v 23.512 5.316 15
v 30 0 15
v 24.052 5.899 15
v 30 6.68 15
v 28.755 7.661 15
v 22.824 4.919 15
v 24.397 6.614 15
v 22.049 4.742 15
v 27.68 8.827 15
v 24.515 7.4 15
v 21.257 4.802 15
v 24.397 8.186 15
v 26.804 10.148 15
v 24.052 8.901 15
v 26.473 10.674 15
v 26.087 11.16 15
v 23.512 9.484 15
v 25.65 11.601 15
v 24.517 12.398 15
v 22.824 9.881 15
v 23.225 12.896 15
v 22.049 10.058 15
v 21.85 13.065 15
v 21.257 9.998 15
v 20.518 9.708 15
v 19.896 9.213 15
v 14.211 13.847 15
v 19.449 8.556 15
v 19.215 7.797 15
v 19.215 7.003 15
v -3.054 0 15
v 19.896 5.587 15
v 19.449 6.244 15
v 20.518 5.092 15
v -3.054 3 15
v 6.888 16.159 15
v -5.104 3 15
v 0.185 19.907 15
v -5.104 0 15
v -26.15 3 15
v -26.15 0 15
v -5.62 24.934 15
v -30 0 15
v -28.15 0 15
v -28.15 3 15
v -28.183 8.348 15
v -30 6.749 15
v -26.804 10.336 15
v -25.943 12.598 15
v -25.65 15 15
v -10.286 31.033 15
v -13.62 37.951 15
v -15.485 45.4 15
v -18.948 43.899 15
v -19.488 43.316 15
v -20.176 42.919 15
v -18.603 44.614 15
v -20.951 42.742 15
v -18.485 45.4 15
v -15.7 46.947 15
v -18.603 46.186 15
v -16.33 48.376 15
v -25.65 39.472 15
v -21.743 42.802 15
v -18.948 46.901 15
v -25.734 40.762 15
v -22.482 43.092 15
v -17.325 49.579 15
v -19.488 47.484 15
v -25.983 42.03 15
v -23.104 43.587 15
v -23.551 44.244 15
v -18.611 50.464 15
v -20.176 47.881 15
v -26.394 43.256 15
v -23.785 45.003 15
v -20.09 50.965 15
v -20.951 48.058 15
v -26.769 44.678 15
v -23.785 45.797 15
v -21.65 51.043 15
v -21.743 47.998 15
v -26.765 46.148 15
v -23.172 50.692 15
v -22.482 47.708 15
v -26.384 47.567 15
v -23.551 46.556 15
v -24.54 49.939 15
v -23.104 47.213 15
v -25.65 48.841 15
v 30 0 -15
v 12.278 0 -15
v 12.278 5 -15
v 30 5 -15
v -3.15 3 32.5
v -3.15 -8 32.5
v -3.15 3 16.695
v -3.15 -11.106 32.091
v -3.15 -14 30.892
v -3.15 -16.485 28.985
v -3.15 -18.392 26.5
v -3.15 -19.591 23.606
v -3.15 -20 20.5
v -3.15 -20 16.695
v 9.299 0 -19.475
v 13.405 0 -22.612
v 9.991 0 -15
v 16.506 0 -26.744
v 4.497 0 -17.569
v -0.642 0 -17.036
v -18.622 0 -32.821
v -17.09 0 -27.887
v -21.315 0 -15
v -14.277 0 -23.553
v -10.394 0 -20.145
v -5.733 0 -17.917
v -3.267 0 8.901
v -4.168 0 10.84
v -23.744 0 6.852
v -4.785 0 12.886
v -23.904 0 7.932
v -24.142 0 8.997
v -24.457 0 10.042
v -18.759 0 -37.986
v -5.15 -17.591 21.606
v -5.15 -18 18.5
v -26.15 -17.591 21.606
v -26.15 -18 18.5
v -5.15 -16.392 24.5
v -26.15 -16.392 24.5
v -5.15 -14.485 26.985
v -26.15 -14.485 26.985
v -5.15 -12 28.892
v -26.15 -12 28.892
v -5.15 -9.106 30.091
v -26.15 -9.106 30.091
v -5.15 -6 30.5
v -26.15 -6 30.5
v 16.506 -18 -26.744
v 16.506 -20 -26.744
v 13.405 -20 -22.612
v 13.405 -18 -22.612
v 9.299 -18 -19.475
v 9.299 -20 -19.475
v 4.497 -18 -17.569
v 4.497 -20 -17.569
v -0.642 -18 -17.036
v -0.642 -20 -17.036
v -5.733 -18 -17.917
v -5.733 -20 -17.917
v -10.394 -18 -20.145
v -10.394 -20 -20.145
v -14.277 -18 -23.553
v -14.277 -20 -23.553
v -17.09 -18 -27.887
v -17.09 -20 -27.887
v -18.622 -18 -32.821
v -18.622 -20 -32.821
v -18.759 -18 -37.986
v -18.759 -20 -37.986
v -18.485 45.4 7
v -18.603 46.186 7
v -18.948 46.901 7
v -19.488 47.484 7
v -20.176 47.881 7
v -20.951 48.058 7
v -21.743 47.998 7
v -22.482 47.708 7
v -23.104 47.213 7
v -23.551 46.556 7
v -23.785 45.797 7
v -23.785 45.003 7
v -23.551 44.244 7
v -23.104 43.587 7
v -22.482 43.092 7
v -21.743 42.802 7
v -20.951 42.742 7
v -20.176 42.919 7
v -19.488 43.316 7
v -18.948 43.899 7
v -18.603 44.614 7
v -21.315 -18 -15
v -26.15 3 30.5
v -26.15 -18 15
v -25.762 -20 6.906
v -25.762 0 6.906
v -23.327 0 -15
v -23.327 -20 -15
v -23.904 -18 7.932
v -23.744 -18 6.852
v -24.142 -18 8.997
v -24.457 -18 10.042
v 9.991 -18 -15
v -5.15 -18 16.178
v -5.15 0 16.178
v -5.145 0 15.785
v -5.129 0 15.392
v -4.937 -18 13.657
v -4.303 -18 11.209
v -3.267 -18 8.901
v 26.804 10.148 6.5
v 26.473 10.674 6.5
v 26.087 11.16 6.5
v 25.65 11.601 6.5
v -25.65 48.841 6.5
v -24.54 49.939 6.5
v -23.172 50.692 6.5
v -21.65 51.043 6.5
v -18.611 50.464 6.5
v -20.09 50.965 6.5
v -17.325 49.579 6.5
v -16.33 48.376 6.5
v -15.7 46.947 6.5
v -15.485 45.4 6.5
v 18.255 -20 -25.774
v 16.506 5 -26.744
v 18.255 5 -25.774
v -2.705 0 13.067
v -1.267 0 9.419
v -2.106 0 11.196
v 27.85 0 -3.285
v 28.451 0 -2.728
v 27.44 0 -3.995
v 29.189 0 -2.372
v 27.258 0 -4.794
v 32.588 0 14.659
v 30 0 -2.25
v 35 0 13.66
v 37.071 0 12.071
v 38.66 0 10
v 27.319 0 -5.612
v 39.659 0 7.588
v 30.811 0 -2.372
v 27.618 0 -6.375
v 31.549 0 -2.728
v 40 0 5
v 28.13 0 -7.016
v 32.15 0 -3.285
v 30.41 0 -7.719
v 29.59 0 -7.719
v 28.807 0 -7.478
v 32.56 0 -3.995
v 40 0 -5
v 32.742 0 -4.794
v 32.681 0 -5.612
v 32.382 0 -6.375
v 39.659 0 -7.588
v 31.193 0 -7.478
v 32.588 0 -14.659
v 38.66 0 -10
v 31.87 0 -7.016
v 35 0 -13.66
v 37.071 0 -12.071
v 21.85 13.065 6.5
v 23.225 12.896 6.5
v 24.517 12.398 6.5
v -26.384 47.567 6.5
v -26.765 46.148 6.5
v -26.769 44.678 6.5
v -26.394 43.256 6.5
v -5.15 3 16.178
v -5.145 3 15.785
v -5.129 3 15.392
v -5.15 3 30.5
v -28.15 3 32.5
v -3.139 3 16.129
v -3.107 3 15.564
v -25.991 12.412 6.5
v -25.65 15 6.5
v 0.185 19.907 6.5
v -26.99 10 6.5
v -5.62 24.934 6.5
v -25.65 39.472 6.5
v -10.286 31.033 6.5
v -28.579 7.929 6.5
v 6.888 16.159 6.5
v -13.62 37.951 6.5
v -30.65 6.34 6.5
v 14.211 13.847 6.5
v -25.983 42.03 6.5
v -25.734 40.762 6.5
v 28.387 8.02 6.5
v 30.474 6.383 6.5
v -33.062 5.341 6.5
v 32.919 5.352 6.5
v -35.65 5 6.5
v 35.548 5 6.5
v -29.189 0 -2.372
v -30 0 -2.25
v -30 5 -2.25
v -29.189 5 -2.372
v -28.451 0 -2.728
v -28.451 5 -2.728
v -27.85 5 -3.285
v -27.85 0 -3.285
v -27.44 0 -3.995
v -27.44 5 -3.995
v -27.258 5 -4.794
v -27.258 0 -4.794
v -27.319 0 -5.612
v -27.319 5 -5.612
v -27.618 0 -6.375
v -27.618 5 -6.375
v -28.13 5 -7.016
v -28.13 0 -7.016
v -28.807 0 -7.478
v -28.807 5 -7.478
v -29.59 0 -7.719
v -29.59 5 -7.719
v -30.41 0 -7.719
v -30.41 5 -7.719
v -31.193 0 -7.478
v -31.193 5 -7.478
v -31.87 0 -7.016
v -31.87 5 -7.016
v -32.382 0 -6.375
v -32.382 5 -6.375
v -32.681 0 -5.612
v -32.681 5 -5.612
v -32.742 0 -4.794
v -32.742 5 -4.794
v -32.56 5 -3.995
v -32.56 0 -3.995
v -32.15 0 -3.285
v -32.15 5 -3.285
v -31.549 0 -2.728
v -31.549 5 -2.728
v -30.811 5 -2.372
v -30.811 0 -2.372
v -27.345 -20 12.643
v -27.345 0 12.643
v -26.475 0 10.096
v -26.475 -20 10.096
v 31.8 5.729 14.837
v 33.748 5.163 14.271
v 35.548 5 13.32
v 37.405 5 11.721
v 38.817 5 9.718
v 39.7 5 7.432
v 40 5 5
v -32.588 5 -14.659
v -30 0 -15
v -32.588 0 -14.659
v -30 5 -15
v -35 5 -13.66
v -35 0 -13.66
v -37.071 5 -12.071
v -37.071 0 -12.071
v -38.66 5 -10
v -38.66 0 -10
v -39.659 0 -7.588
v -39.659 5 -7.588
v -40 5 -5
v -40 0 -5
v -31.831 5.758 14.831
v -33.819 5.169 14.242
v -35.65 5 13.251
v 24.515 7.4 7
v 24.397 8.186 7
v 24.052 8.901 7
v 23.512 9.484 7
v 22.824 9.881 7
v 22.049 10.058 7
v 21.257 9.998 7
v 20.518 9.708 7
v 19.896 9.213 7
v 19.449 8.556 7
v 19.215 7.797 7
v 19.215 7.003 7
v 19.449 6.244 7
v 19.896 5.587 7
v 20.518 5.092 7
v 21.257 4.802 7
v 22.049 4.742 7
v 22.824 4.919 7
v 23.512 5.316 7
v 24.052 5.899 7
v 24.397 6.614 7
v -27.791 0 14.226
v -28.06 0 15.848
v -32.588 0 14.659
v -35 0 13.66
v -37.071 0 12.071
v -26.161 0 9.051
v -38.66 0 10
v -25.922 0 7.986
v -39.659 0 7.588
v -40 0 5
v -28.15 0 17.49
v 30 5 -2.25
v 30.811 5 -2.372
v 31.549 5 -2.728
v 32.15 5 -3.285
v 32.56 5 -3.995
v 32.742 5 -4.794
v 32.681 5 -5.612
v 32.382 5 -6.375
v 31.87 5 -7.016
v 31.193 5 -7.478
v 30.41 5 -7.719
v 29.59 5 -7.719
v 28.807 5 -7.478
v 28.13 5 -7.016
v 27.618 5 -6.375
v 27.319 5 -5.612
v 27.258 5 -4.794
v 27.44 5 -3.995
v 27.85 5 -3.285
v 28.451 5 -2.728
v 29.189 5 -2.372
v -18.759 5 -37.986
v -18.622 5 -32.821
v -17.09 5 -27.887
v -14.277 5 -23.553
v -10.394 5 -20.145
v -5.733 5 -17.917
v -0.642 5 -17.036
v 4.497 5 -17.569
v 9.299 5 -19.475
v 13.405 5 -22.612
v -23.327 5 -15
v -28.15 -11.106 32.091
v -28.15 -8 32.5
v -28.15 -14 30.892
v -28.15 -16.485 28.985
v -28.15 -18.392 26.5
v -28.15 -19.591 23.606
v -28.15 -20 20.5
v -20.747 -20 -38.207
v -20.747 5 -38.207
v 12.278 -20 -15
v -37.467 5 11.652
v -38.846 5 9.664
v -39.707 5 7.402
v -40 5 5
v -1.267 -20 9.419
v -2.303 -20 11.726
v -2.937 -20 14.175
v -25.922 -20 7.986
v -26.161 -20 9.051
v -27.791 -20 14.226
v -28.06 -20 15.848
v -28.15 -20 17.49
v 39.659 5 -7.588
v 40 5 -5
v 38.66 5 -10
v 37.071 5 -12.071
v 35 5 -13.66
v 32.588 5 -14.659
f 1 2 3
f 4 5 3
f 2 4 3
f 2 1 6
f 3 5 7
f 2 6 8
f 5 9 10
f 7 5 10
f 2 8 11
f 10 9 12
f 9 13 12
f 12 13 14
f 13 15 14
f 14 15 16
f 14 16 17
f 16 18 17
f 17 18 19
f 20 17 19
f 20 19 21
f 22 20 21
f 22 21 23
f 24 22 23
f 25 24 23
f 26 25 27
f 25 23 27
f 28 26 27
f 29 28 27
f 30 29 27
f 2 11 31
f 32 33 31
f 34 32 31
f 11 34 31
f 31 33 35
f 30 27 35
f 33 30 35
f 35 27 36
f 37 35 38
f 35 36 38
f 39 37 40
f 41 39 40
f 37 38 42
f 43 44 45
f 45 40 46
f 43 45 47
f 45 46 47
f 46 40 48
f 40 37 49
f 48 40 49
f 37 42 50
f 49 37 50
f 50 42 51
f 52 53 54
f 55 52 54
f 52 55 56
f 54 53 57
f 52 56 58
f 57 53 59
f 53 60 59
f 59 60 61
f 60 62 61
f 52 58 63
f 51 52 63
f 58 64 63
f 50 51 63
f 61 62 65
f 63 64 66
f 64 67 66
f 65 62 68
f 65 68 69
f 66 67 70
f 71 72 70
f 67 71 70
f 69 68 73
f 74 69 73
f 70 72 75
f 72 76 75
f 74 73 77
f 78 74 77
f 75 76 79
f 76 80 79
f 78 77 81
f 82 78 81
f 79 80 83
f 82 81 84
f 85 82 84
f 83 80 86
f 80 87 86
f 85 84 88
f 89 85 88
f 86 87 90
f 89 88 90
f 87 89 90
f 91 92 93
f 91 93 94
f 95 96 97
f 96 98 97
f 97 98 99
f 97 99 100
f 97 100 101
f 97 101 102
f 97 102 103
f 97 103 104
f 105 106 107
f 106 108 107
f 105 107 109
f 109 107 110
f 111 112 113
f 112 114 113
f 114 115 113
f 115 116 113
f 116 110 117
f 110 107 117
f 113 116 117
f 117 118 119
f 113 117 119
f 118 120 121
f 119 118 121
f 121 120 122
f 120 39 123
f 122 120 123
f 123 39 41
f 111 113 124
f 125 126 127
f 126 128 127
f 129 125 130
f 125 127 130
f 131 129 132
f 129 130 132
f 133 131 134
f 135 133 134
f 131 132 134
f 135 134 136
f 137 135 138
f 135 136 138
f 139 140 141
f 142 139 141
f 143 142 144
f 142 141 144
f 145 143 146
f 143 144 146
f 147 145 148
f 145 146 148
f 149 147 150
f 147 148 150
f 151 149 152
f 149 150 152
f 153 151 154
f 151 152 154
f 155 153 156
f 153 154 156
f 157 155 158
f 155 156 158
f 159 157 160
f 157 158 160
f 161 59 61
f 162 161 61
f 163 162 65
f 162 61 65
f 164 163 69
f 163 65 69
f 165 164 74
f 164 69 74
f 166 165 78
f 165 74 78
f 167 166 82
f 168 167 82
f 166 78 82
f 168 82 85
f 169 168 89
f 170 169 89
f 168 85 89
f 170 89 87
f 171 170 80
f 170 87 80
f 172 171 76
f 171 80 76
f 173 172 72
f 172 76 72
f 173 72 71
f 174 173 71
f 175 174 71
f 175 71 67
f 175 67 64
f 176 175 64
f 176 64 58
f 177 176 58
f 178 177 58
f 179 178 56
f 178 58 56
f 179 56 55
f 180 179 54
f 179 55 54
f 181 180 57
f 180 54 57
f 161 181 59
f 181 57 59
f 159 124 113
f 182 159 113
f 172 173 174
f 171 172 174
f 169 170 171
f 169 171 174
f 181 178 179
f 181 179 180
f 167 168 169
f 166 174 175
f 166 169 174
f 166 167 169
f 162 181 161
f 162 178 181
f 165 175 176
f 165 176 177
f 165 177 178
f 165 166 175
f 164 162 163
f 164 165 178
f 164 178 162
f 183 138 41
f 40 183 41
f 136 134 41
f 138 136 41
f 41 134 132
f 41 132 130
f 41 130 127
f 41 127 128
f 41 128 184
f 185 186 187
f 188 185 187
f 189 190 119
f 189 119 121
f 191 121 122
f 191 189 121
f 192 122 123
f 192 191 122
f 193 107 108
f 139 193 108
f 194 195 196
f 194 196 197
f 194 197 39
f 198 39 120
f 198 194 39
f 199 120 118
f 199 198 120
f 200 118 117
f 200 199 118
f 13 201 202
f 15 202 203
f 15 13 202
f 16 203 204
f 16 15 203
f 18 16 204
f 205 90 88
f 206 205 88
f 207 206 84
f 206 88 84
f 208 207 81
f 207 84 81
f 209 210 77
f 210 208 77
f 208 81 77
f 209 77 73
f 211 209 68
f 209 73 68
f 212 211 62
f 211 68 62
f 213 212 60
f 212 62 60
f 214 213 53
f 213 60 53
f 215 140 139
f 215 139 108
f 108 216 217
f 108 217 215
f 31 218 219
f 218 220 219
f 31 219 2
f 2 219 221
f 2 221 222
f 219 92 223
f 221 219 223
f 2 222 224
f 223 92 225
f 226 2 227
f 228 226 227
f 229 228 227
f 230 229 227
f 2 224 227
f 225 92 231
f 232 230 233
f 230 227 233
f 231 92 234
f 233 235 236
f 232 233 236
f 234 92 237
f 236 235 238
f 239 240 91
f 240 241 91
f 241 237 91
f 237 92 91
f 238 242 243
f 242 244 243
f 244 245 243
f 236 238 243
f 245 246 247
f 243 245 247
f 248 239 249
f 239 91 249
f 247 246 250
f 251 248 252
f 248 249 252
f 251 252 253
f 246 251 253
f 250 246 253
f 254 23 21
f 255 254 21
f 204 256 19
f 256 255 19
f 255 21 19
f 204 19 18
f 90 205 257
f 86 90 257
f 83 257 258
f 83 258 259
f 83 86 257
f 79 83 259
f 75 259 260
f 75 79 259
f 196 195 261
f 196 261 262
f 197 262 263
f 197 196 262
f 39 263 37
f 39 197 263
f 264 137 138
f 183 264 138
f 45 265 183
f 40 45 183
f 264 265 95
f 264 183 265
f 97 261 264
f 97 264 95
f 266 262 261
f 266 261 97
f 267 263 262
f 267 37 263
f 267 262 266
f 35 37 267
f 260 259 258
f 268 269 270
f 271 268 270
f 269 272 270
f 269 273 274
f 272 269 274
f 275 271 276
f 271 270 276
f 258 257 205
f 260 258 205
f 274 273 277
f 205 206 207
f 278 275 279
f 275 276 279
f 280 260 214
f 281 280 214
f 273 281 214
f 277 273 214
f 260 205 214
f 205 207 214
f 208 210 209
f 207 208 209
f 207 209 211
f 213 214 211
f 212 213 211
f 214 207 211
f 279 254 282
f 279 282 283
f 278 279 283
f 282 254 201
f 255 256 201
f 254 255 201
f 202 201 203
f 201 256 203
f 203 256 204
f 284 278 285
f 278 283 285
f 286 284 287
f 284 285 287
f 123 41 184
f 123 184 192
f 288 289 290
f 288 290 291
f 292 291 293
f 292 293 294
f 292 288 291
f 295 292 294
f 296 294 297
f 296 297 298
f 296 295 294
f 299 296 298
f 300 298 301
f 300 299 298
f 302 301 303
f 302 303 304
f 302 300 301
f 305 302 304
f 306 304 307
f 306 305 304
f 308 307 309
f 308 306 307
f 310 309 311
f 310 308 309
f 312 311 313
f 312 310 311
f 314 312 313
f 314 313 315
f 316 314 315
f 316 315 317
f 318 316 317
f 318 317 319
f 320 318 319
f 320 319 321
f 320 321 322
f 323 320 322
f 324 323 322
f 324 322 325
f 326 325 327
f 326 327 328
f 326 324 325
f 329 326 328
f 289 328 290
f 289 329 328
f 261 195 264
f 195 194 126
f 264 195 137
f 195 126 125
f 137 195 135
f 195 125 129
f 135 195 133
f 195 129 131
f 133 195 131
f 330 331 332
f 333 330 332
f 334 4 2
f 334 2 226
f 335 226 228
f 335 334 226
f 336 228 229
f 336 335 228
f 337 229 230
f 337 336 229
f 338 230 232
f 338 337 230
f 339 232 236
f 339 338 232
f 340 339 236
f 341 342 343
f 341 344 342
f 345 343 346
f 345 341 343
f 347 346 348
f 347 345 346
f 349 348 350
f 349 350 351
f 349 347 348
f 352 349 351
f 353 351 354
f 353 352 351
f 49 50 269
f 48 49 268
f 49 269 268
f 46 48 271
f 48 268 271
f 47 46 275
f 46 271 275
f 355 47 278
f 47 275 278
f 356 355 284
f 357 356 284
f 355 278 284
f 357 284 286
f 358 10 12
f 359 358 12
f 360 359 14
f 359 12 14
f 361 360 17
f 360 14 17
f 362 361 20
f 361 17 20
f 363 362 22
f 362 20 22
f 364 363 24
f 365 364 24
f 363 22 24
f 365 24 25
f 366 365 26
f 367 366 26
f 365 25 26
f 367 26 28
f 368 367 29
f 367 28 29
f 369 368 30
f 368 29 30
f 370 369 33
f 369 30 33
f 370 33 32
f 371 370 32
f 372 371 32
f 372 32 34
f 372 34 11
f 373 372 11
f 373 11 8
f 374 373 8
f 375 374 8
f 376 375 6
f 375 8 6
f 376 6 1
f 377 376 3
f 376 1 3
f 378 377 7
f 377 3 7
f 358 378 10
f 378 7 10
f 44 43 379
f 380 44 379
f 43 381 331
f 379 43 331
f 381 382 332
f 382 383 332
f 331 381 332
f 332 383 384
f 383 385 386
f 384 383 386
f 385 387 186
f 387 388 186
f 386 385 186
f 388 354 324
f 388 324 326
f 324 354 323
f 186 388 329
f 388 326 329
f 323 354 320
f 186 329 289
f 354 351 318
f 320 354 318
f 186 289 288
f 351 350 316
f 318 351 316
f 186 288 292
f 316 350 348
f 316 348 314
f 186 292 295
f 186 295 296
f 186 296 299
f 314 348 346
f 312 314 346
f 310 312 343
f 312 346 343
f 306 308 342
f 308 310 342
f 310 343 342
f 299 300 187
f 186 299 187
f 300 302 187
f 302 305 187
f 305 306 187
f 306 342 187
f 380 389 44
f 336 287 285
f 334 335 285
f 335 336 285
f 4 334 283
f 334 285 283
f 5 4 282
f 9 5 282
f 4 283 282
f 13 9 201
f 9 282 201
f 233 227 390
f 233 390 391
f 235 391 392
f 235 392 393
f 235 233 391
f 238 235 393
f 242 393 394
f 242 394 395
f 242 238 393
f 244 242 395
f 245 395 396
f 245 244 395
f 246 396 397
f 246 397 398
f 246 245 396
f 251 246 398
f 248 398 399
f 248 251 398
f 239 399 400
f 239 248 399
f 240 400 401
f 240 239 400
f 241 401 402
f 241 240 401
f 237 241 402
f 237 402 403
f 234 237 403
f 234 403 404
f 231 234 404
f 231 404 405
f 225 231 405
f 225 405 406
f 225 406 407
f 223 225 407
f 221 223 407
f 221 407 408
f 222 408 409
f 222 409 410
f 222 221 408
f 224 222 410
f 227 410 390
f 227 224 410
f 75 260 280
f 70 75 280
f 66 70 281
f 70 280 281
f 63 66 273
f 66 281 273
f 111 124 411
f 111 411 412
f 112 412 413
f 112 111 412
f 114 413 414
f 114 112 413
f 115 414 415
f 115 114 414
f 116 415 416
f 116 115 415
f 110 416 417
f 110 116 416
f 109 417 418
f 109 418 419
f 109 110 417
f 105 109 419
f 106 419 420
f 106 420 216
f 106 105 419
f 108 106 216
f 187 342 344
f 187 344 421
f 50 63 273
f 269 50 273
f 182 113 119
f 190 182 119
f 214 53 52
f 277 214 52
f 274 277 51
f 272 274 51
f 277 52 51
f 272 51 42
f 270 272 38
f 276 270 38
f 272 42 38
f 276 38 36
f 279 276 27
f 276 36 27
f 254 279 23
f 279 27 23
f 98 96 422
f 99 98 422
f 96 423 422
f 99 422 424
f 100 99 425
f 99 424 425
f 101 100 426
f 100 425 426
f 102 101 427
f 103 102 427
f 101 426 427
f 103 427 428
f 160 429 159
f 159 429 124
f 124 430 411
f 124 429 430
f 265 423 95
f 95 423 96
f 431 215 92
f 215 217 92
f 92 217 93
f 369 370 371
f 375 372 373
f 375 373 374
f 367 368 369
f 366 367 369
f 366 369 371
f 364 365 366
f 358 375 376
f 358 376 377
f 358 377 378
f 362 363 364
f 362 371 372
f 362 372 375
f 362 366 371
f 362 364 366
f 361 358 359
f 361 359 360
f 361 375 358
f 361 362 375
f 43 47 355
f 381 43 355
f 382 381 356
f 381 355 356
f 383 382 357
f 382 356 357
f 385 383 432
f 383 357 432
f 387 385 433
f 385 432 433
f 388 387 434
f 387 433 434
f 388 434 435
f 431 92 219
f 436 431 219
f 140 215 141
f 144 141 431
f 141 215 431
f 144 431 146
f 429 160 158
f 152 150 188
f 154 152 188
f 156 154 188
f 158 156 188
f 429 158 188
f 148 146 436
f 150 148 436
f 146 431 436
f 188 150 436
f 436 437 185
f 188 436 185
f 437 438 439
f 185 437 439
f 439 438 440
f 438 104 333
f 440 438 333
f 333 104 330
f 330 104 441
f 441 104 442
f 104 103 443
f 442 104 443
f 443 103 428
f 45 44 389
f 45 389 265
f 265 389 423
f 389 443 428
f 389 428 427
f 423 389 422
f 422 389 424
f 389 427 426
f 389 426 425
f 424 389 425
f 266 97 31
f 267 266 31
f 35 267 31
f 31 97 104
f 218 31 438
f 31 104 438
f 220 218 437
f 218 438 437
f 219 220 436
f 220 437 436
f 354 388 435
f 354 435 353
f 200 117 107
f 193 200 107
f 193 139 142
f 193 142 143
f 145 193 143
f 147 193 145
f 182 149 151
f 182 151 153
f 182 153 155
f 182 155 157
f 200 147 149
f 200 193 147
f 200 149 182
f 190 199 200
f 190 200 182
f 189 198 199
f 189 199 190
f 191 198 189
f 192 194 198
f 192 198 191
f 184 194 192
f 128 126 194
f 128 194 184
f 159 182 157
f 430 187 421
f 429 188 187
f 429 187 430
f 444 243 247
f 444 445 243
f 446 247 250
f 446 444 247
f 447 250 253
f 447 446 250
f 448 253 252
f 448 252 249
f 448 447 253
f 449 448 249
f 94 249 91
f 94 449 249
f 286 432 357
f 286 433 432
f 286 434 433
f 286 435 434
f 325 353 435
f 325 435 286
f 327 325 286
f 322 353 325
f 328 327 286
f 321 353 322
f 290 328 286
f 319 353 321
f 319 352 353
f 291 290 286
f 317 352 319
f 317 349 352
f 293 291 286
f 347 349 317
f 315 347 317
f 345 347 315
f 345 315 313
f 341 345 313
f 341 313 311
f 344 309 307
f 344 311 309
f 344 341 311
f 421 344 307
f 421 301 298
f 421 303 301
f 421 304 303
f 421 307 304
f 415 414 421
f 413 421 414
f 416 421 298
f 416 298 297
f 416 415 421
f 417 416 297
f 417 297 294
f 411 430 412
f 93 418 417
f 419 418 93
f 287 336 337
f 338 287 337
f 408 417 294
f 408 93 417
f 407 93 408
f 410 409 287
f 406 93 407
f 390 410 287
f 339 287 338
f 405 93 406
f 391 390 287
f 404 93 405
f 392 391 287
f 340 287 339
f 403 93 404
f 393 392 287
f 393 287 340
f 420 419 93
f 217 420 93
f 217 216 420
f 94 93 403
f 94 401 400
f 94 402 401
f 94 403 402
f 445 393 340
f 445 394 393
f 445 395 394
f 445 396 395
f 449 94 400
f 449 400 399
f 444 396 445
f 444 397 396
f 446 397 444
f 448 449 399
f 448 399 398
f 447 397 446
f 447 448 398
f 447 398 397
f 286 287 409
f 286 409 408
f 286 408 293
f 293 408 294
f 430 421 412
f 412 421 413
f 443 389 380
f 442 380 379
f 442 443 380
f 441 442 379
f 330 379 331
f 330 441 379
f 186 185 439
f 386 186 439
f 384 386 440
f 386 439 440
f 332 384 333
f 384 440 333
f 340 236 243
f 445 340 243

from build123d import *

# Parameters (mm, degrees)
SKETCH1_W           = 80
SKETCH1_H           = 30
SKETCH1_R           = 2.75
BOSS_EXTRUDE1_DEPTH = 5
SKETCH2_W           = 51.3
SKETCH2_H           = 8.5
BOSS_EXTRUDE2_DEPTH = 50
SKETCH3_R           = 2.665
CUT_EXTRUDE1_DEPTH  = 8
CUT_EXTRUDE2_REACH  = 76.33
BOSS_EXTRUDE3_DEPTH = 8.5
FILLET1_START       = 6.5
FILLET1_DEPTH       = 8.5
FILLET2_R           = 10
BOSS_EXTRUDE5_DEPTH = 5
BOSS_EXTRUDE6_DEPTH = 20
BOSS_EXTRUDE7_DEPTH = 20
CUT_EXTRUDE3_DEPTH  = 20
BOSS_EXTRUDE8_DEPTH = 3
FILLET4_START       = -20
FILLET4_DEPTH       = 20
FILLET4_2_DEPTH     = 4
FILLET4_3_DEPTH     = 23
BOSS_EXTRUDE9_DEPTH = 2
FILLET5_R           = 12


with BuildPart() as part:
    # Sketch1 → Boss-Extrude1 (new body)
    with BuildSketch(Plane(origin=(0, 0, 0), x_dir=(1, 0, 0), z_dir=(0, 1, 0))):
        Rectangle(SKETCH1_W, SKETCH1_H)
        with Locations(Location((30, 5, 0), (0, 0, 270))):
            Circle(SKETCH1_R, mode=Mode.SUBTRACT)
        with Locations(Location((-30, 5, 0), (0, 0, 270))):
            Circle(SKETCH1_R, mode=Mode.SUBTRACT)
    extrude(amount=BOSS_EXTRUDE1_DEPTH)

    # Sketch2 → Boss-Extrude2 (add)
    with BuildSketch(Plane(origin=(0, 5, 0), x_dir=(1, 0, 0), z_dir=(0, 1, 0))):
        with Locations((0, -10.75)):
            Rectangle(SKETCH2_W, SKETCH2_H)
    extrude(amount=BOSS_EXTRUDE2_DEPTH)

    # Sketch3 → Cut-Extrude1 (cut)
    with BuildSketch(Plane.XY.offset(15)):
        with Locations((21.85, 7.4)):
            Circle(SKETCH3_R)
        with Locations((-21.15, 45.4)):
            Circle(SKETCH3_R)
    extrude(amount=-CUT_EXTRUDE1_DEPTH, mode=Mode.SUBTRACT)

    # Sketch5 → Cut-Extrude2 (cut, up to next)
    with BuildSketch(Plane.XY.offset(15), mode=Mode.PRIVATE) as cut_extrude2_sk1:
        with BuildLine():
            ThreePointArc((-15.485, 45.4), (-2.845416832, 22.272479127), (21.85, 13.065))
            ThreePointArc((21.85, 13.065), (23.886047867, 12.68646707), (25.65, 11.601455105))
            Line((25.65, 11.601455105), (25.65, 55))
            Line((25.65, 55), (-25.65, 55))
            Line((-25.65, 55), (-25.65, 48.841253405))
            ThreePointArc((-25.65, 48.841253405), (-19.333447634, 50.765851517), (-15.485, 45.4))
        make_face()
    cut_extrude2_tool1 = extrude(cut_extrude2_sk1.sketch, amount=-CUT_EXTRUDE2_REACH, mode=Mode.PRIVATE) & part.part
    add(cut_extrude2_tool1.solids().sort_by_distance((6.645392, 37.171167, 15))[0], mode=Mode.SUBTRACT)

    # Sketch5<3> → Boss-Extrude3 (add)
    with BuildSketch(Plane.XY.offset(15)):
        with BuildLine():
            Line((25.65, 5), (26.981493447, 5))
            ThreePointArc((26.981493447, 5), (27.380015162, 6.170708615), (27.515, 7.4))
            ThreePointArc((27.515, 7.4), (27.027799967, 9.698393461), (25.65, 11.601455105))
            Line((25.65, 11.601455105), (25.65, 5))
        make_face()
        with BuildLine():
            ThreePointArc((-25.65, 48.841253405), (-26.815, 45.4), (-25.65, 41.958746595))
            Line((-25.65, 41.958746595), (-25.65, 48.841253405))
        make_face()
    extrude(amount=-BOSS_EXTRUDE3_DEPTH)

    # Fillet1: read off the stored shape, not the designer's step
    # Fillet1 outline → Fillet1 (add)
    with BuildSketch(Plane.XY.offset(FILLET1_START)):
        with BuildLine():
            ThreePointArc((-26.393696138, 43.256200613), (-25.837685324, 41.400248446), (-25.65, 39.471912197))
            Line((-25.65, 39.471912197), (-25.65, 41.958746595))
            ThreePointArc((-25.65, 41.958746595), (-26.064849981, 42.582825057), (-26.393696138, 43.256200613))
        make_face()
        with BuildLine():
            Line((-35.65, 5), (-25.65, 5))
            Line((-25.65, 5), (-25.65, 15))
            ThreePointArc((-25.65, 15), (-28.578932188, 7.928932188), (-35.65, 5))
        make_face()
        with BuildLine():
            ThreePointArc((35.547891261, 5), (30.474223926, 6.382697651), (26.803626173, 10.148420045))
            ThreePointArc((26.803626173, 10.148420045), (27.511622265, 7.595597351), (26.981493447, 5))
            Line((26.981493447, 5), (35.547891261, 5))
        make_face()
    extrude(amount=FILLET1_DEPTH)

    # Fillet2
    fillet2_edges = [part.edges().sort_by_distance(p)[0] for p in [
        (40, 2.5, 15),
        (40, 2.5, -15),
        (-40, 2.5, -15),
        (-40, 2.5, 15),
    ]]
    fillet(fillet2_edges, radius=FILLET2_R)

    # Sketch7 → Boss-Extrude5 (add)
    with BuildSketch(Plane.XZ):
        with BuildLine():
            Line((16.505683811, -26.744235317), (9.991112457, -15))
            Line((9.991112457, -15), (-21.314804171, -15))
            Line((-21.314804171, -15), (-18.759427627, -37.985545514))
            ThreePointArc((-18.759427627, -37.985545514), (-5.732504168, -17.916562593), (16.505683811, -26.744235317))
        make_face()
        Polygon((-18.759427627, -37.985545514), (-21.314804171, -15), (-23.327125696, -15), (-20.747181548, -38.206530469), align=None)
        Polygon((12.278203403, -15), (9.991112457, -15), (16.505683811, -26.744235317), (18.25463044, -25.774088066), align=None)
    extrude(amount=-BOSS_EXTRUDE5_DEPTH)

    # Sketch7<6> → Boss-Extrude6 (add)
    with BuildSketch(Plane.XZ):
        Polygon((-4.362909054, 15), (-6.65, 15), (9.991112457, -15), (12.278203403, -15), align=None)
        Polygon((12.278203403, -15), (9.991112457, -15), (16.505683811, -26.744235317), (18.25463044, -25.774088066), align=None)
        Polygon((-21.314804171, -15), (-24.650000035, 15), (-26.662321559, 15), (-26.637753956, 14.779015045), (-23.327125696, -15), align=None)
        Polygon((-18.759427627, -37.985545514), (-21.314804171, -15), (-23.327125696, -15), (-20.747181548, -38.206530469), align=None)
    extrude(amount=BOSS_EXTRUDE6_DEPTH)

    # Sketch8 → Boss-Extrude7 (add)
    with BuildSketch(Plane.XZ):
        Polygon((-5.15, 30.5), (-5.15, 22), (-5.15, 15), (-4.362909054, 15), (-3.15, 15), (-3.15, 22), (-3.15, 32.5), (-28.15, 32.5), (-28.15, 22), (-28.15, 15), (-25.9441307, 8.539891907), (-26.662321559, 15), (-26.15, 15), (-26.15, 22), (-26.15, 30.5), align=None)
        Polygon((-3.15, 15), (-4.362909054, 15), (-3.15, 12.813411109), align=None)
    extrude(amount=BOSS_EXTRUDE7_DEPTH)

    # Sketch8<3> → Cut-Extrude3 (cut)
    with BuildSketch(Plane.XZ):
        Polygon((-23.925860843, 8.48638681), (-24.650000035, 15), (-26.15, 15), align=None)
        Polygon((-6.65, 15), (-5.15, 15), (-5.15, 12.295853861), align=None)
    extrude(amount=CUT_EXTRUDE3_DEPTH, mode=Mode.SUBTRACT)

    # Sketch9 → Boss-Extrude8 (add)
    with BuildSketch(Plane(origin=(0, 0, 0), x_dir=(1, 0, 0), z_dir=(0, 1, 0))):
        Polygon((-3.15, -32.5), (-3.15, -15), (-5.15, -15), (-5.15, -30.5), (-26.15, -30.5), (-26.15, -15), (-28.15, -15), (-28.15, -32.5), align=None)
    extrude(amount=BOSS_EXTRUDE8_DEPTH)

    # Fillet4: read off the stored shape, not the designer's step
    # Fillet4 outline → Fillet4 (cut)
    with BuildSketch(Plane(origin=(0, 0, 0), x_dir=(1, 0, 0), z_dir=(0, 1, 0)).offset(FILLET4_START)):
        with BuildLine():
            ThreePointArc((-5.15, -16.177533225), (-4.671647561, -12.419641247), (-3.267099718, -8.901428842))
            Line((-3.267099718, -8.901428842), (-5.15, -12.295853861))
            Line((-5.15, -12.295853861), (-5.15, -16.177533225))
        make_face()
        with BuildLine():
            ThreePointArc((-28.15, -17.490360897), (-27.947447955, -15.033628513), (-27.345262132, -12.643244951))
            Line((-27.345262132, -12.643244951), (-28.15, -15))
            Line((-28.15, -15), (-28.15, -17.490360897))
        make_face()
        with BuildLine():
            ThreePointArc((-23.744211533, -6.852455992), (-24.013520151, -8.466795288), (-24.457103806, -10.042184774))
            Line((-24.457103806, -10.042184774), (-23.925860843, -8.48638681))
            Line((-23.925860843, -8.48638681), (-23.744211533, -6.852455992))
        make_face()
    extrude(amount=FILLET4_DEPTH, mode=Mode.SUBTRACT)

    # Fillet4 2 outline → Fillet4 2 (cut)
    with BuildSketch(Plane(origin=(0, 0, 0), x_dir=(1, 0, 0), z_dir=(0, 1, 0))):
        with BuildLine():
            Line((-5.15, -15), (-5.15, -16.177533225))
            ThreePointArc((-5.15, -16.177533225), (-5.138422804, -15.588311844), (-5.103709089, -15))
            Line((-5.103709089, -15), (-5.15, -15))
        make_face()
    extrude(amount=FILLET4_2_DEPTH, mode=Mode.SUBTRACT)

    # Fillet4 3 outline → Fillet4 3 (add)
    with BuildSketch(Plane(origin=(0, 0, 0), x_dir=(1, 0, 0), z_dir=(0, 1, 0)).offset(FILLET4_START)):
        with BuildLine():
            ThreePointArc((-25.76248139, -6.905961089), (-26.031790008, -8.520300385), (-26.475373663, -10.095689871))
            Line((-26.475373663, -10.095689871), (-25.9441307, -8.539891907))
            Line((-25.9441307, -8.539891907), (-25.76248139, -6.905961089))
        make_face()
        with BuildLine():
            Line((-3.15, -12.813411109), (-3.15, -16.695090474))
            ThreePointArc((-3.15, -16.695090474), (-2.671647561, -12.937198496), (-1.267099718, -9.41898609))
            Line((-1.267099718, -9.41898609), (-3.15, -12.813411109))
        make_face()
    extrude(amount=FILLET4_3_DEPTH)

    # Sketch10 → Boss-Extrude9 (add)
    with BuildSketch(Plane.XZ.offset(20)):
        with BuildLine():
            ThreePointArc((16.505683811, -26.744235317), (-5.732504168, -17.916562593), (-18.759427627, -37.985545514))
            Line((-18.759427627, -37.985545514), (-23.744211533, 6.852455992))
            ThreePointArc((-23.744211533, 6.852455992), (-24.013520151, 8.466795288), (-24.457103806, 10.042184774))
            Line((-24.457103806, 10.042184774), (-26.15, 15))
            Line((-26.15, 15), (-26.15, 30.5))
            Line((-26.15, 30.5), (-5.15, 30.5))
            Line((-5.15, 30.5), (-5.15, 16.177533225))
            ThreePointArc((-5.15, 16.177533225), (-4.671647561, 12.419641247), (-3.267099718, 8.901428842))
            Line((-3.267099718, 8.901428842), (16.505683811, -26.744235317))
        make_face()
        with BuildLine():
            Line((-26.15, 30.5), (-5.15, 30.5))
            Line((-5.15, 30.5), (-5.15, 16.177533225))
            ThreePointArc((-5.15, 16.177533225), (-4.671647561, 12.419641247), (-3.267099718, 8.901428842))
            Line((-3.267099718, 8.901428842), (16.505683811, -26.744235317))
            Line((16.505683811, -26.744235317), (18.25463044, -25.774088066))
            Line((18.25463044, -25.774088066), (-1.267099718, 9.41898609))
            ThreePointArc((-1.267099718, 9.41898609), (-2.671647561, 12.937198496), (-3.15, 16.695090474))
            Line((-3.15, 16.695090474), (-3.15, 32.5))
            Line((-3.15, 32.5), (-28.15, 32.5))
            Line((-28.15, 32.5), (-28.15, 17.490360897))
            ThreePointArc((-28.15, 17.490360897), (-27.947447955, 15.033628513), (-27.345262132, 12.643244951))
            Line((-27.345262132, 12.643244951), (-26.475373663, 10.095689871))
            ThreePointArc((-26.475373663, 10.095689871), (-26.031790008, 8.520300385), (-25.76248139, 6.905961089))
            Line((-25.76248139, 6.905961089), (-20.747181548, -38.206530469))
            Line((-20.747181548, -38.206530469), (-18.759427627, -37.985545514))
            Line((-18.759427627, -37.985545514), (-23.744211533, 6.852455992))
            ThreePointArc((-23.744211533, 6.852455992), (-24.013520151, 8.466795288), (-24.457103806, 10.042184774))
            Line((-24.457103806, 10.042184774), (-26.15, 15))
            Line((-26.15, 15), (-26.15, 30.5))
        make_face()
    extrude(amount=-BOSS_EXTRUDE9_DEPTH)

    # Fillet5
    fillet5_edges = [part.edges().sort_by_distance(p)[0] for p in [
        (-15.65, -20, 32.5),
        (-15.65, -18, 30.5),
    ]]
    fillet(fillet5_edges, radius=FILLET5_R)


solid = part.part
